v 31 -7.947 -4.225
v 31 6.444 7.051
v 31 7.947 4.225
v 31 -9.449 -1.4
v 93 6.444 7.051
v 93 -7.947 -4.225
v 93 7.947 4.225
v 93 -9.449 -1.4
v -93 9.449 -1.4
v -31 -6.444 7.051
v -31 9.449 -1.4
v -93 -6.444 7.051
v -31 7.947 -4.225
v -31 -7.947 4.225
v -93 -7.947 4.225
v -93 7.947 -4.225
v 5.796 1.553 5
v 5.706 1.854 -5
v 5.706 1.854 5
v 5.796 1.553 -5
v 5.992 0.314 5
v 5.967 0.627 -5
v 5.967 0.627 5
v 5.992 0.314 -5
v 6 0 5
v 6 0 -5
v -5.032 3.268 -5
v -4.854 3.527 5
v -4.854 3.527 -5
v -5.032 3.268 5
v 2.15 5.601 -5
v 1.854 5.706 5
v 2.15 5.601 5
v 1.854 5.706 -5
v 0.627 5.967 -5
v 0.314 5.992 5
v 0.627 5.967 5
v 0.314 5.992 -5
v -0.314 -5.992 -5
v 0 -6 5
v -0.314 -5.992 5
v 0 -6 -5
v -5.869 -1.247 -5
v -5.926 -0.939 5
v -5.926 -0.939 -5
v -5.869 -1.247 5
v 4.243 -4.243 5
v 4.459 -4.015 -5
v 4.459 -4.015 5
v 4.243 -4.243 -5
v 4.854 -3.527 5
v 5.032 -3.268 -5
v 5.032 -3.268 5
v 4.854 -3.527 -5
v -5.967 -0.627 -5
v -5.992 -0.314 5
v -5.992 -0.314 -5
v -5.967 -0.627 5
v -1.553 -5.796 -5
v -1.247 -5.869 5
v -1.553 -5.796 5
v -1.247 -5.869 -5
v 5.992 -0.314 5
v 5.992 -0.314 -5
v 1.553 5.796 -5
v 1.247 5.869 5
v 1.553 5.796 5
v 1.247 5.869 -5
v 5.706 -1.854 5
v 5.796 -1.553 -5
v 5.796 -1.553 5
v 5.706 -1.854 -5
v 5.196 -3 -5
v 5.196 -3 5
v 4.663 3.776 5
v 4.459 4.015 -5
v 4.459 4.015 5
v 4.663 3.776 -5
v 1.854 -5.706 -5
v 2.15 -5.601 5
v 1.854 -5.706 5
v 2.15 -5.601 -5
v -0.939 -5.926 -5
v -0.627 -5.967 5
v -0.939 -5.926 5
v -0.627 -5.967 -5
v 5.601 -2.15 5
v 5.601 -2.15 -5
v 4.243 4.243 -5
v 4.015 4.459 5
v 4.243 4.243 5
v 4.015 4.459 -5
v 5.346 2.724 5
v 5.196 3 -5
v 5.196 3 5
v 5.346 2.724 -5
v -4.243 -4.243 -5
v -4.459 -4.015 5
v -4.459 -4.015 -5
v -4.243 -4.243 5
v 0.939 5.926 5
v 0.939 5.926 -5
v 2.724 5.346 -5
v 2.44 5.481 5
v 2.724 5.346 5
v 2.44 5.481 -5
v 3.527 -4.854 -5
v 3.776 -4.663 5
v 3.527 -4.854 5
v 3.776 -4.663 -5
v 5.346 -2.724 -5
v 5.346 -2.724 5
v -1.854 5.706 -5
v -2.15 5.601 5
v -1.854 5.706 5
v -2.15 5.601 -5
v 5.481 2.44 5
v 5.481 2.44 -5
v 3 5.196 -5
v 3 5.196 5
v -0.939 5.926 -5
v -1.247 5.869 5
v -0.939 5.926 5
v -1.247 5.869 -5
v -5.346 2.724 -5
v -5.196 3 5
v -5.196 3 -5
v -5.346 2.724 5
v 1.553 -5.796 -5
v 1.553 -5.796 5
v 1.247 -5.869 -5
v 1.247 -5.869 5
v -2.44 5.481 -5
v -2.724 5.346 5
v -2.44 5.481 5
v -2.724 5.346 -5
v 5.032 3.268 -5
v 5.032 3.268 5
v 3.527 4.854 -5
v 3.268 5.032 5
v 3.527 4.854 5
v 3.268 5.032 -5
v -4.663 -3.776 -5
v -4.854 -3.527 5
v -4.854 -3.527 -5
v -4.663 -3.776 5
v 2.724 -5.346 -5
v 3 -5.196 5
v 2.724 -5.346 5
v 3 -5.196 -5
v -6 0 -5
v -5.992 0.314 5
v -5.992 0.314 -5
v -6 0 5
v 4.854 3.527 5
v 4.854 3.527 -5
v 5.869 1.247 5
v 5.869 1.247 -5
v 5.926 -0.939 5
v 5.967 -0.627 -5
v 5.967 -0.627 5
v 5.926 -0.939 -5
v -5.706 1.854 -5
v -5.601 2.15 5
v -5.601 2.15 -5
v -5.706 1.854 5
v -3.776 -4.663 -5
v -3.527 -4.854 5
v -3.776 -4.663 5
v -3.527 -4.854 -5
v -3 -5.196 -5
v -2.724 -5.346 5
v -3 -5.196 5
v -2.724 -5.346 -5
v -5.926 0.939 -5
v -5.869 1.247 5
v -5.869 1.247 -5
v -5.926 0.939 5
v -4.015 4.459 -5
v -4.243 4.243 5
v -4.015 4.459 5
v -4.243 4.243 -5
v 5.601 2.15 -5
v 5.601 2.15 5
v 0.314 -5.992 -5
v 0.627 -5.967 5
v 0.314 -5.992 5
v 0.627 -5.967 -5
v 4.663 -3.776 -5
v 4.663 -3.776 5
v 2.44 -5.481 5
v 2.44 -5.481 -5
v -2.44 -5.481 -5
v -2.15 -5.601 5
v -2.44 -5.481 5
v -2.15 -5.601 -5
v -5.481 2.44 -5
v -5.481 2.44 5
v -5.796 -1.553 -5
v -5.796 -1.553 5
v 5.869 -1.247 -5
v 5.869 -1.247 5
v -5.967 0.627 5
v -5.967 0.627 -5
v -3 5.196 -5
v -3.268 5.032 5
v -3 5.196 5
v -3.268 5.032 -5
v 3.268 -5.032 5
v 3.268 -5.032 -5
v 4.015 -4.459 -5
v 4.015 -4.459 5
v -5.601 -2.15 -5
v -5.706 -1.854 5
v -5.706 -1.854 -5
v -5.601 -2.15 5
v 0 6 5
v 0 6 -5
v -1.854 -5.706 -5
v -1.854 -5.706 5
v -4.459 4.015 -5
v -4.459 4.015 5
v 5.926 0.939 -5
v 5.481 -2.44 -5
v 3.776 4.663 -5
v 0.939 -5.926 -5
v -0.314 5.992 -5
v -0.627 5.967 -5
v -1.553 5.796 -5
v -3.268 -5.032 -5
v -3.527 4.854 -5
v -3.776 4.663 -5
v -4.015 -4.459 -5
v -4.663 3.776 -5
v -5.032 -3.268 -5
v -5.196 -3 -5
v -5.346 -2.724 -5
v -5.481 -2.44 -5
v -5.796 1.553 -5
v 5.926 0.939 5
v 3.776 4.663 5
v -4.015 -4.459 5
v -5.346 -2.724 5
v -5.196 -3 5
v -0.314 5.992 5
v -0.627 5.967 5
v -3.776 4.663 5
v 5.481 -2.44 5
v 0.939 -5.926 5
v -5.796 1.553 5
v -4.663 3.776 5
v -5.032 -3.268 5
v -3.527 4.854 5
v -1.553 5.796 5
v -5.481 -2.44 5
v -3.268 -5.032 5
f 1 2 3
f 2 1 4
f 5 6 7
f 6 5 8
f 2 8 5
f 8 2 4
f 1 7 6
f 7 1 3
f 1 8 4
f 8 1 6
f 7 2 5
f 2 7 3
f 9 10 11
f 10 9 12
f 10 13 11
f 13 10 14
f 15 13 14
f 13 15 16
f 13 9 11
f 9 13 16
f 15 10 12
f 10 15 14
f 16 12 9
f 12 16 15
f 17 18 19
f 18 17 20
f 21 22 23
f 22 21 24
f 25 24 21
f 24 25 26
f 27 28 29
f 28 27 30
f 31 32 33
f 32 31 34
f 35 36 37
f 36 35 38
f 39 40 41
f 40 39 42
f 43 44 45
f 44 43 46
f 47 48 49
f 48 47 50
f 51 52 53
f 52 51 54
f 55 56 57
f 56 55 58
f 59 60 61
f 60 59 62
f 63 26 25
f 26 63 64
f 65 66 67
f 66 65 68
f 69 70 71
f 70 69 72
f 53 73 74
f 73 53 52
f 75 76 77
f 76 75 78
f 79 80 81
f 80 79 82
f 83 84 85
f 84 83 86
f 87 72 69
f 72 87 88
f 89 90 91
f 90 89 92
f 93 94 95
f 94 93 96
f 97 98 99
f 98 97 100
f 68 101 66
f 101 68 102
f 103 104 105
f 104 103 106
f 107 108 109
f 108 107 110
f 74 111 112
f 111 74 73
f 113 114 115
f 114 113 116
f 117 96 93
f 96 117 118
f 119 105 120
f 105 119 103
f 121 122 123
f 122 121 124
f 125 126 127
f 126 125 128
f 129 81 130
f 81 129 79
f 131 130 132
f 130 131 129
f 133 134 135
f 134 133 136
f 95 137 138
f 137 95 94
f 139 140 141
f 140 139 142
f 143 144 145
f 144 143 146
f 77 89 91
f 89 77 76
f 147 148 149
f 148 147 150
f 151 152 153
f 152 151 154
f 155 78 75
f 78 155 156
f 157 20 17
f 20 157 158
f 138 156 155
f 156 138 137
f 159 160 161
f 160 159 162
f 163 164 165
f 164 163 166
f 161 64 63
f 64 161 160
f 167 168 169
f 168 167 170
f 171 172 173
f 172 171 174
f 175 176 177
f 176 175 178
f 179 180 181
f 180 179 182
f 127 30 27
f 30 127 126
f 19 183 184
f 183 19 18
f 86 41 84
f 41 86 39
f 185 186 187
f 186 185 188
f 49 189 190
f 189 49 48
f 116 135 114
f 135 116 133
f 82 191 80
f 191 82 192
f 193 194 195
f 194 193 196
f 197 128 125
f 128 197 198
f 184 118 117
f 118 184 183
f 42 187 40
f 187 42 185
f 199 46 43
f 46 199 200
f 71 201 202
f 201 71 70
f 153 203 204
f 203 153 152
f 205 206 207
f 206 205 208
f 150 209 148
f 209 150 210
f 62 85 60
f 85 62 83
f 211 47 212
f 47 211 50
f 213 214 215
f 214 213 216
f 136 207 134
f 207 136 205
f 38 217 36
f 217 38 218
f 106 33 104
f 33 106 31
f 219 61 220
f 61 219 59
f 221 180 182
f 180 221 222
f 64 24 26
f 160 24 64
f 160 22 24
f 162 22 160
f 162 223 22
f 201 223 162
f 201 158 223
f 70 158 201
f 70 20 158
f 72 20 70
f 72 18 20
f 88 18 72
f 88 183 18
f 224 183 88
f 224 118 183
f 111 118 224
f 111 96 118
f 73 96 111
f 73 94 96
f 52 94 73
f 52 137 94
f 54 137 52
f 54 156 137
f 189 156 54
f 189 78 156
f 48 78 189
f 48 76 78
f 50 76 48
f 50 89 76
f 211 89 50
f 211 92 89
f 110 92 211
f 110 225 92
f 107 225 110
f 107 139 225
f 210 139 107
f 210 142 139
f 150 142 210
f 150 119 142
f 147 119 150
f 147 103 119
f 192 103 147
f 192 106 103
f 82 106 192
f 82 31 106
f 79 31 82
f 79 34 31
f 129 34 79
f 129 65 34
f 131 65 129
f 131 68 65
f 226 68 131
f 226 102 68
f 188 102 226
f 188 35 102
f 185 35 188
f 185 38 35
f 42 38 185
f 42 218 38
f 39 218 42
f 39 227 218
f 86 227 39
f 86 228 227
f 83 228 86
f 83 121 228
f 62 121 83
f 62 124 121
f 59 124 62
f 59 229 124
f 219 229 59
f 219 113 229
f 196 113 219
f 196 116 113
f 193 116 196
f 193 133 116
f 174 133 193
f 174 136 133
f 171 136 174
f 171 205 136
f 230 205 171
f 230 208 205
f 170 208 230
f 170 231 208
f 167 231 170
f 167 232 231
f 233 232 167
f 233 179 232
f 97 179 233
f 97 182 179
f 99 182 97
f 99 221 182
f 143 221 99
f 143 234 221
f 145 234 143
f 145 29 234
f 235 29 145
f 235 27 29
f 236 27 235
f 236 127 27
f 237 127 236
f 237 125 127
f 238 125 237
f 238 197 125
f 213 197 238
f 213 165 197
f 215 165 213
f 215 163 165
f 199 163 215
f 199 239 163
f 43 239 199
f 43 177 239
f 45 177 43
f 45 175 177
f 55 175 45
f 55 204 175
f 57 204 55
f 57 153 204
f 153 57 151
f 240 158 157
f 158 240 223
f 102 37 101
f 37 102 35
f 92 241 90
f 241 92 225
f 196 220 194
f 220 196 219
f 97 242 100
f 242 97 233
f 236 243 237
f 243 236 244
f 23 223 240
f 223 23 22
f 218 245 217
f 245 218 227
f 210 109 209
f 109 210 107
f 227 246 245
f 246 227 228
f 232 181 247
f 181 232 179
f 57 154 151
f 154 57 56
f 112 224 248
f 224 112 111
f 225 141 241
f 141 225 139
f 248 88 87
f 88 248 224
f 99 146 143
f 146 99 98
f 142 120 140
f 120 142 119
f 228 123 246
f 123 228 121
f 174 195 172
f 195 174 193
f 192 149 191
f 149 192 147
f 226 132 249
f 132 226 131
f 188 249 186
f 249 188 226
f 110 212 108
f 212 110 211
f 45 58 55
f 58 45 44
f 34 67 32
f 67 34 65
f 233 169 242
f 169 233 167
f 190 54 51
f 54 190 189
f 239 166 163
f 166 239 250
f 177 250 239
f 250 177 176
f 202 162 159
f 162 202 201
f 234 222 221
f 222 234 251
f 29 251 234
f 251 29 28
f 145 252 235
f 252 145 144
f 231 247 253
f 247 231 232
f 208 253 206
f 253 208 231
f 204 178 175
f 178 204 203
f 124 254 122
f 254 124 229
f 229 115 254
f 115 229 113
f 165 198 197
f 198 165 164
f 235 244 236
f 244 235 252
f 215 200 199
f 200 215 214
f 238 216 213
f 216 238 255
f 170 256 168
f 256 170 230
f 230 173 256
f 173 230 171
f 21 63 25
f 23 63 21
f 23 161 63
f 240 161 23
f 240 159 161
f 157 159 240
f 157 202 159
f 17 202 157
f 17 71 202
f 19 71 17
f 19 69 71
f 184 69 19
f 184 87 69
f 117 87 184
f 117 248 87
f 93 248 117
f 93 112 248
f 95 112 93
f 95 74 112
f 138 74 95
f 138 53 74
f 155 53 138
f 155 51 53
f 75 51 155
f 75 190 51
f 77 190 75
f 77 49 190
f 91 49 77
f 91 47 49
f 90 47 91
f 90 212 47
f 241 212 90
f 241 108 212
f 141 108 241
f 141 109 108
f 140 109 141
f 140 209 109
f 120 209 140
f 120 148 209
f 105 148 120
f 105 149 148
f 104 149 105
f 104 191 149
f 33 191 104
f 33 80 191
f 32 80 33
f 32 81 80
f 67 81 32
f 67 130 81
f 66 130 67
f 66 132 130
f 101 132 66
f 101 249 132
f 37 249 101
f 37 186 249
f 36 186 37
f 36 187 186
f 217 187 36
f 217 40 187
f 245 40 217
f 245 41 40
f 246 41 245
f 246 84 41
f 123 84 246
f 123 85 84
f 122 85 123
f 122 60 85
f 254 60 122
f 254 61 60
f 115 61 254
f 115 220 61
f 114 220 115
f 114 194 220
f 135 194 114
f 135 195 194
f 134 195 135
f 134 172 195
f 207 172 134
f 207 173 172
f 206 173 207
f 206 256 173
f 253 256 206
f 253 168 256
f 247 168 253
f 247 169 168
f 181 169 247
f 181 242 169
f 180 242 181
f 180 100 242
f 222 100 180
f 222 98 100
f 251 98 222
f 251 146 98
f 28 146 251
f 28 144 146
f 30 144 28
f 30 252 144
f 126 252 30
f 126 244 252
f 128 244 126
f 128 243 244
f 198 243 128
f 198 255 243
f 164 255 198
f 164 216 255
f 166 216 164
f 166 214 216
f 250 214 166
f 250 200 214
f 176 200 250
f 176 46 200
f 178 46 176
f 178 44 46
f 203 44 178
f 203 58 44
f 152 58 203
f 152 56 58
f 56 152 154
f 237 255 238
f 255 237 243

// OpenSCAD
// file: Bird_Config.scad
/////////////////////////////////////////////////////////
// 7" Spinning Trolling Bird
// Global Parameters
// Units = mm
/////////////////////////////////////////////////////////

$fn = 120;

//----------------------------
// Overall Dimensions
//----------------------------

overall_length = 177.8;
body_length    = 114.3;
nose_length    = 63.5;

max_diameter   = 50.8;
tail_diameter  = 8.0;
nose_tip       = 8.0;

//----------------------------
// Wall Thickness
//----------------------------

wall = 2.8;

//----------------------------
// Shaft
//----------------------------

shaft_diameter = 4.0;
bearing_diameter = 6.0;

shaft_length = 150;

shaft_clearance = 0.20;

//----------------------------
// Hardware
//----------------------------

screw = 3.0;

insert_OD = 5.0;
insert_length = 4.0;

insert_depth = 5.2;

num_screws = 6;

//----------------------------
// Tow Eye
//----------------------------

eye_OD = 10;
eye_ID = 5;
eye_length = 8;

//----------------------------
// Ballast Cavity
//----------------------------

ballast_diameter = 18;
ballast_length = 60;

//----------------------------
// Rotor
//----------------------------

blade_count = 2;

blade_span = 62;

blade_width = 18;

blade_thickness = 3.2;

blade_pitch = 28;

//----------------------------
// Nose Bearing
//----------------------------

bearing_OD = 12;

bearing_ID = 6.1;

bearing_depth = 10;

//----------------------------
// Alignment Pins
//----------------------------

pin_diameter = 3.0;

pin_length = 8;

//----------------------------
// Split Plane
//----------------------------

split = 0;

//----------------------------
// Clearances
//----------------------------

fit = 0.20;
// file: Bird_Rotor.scad
include <Bird_Config.scad>;

//////////////////////////////////////////////////////
// 7" Trolling Bird
// Rotor Assembly
//////////////////////////////////////////////////////

module rotor_hub(){

    cylinder(
        d=bearing_OD,
        h=bearing_depth,
        center=true);

}

module rotor_blade(){

    // Single blade - will be rotated and arrayed

    translate([blade_span/2, 0, 0])

    rotate([blade_pitch, 0, 0])

    translate([0, -blade_width/2, 0])

    cube([blade_span, blade_width, blade_thickness], center=false);

}

module rotor_blades(){

    for(i = [0 : blade_count-1]){

        rotate([0, 0, (360/blade_count)*i])
            rotor_blade();

    }

}

module rotor_assembly(){

    union(){

        rotor_hub();

        rotor_blades();

    }

}

//////////////////////////////////////////////////////
// EXPORT ROTOR
//////////////////////////////////////////////////////

// rotor_assembly();
// main file
include <Bird_Rotor.scad>;

//////////////////////////////////////////////////////
// Export: Rotor Assembly (for 3D printing)
//////////////////////////////////////////////////////

rotor_assembly();
